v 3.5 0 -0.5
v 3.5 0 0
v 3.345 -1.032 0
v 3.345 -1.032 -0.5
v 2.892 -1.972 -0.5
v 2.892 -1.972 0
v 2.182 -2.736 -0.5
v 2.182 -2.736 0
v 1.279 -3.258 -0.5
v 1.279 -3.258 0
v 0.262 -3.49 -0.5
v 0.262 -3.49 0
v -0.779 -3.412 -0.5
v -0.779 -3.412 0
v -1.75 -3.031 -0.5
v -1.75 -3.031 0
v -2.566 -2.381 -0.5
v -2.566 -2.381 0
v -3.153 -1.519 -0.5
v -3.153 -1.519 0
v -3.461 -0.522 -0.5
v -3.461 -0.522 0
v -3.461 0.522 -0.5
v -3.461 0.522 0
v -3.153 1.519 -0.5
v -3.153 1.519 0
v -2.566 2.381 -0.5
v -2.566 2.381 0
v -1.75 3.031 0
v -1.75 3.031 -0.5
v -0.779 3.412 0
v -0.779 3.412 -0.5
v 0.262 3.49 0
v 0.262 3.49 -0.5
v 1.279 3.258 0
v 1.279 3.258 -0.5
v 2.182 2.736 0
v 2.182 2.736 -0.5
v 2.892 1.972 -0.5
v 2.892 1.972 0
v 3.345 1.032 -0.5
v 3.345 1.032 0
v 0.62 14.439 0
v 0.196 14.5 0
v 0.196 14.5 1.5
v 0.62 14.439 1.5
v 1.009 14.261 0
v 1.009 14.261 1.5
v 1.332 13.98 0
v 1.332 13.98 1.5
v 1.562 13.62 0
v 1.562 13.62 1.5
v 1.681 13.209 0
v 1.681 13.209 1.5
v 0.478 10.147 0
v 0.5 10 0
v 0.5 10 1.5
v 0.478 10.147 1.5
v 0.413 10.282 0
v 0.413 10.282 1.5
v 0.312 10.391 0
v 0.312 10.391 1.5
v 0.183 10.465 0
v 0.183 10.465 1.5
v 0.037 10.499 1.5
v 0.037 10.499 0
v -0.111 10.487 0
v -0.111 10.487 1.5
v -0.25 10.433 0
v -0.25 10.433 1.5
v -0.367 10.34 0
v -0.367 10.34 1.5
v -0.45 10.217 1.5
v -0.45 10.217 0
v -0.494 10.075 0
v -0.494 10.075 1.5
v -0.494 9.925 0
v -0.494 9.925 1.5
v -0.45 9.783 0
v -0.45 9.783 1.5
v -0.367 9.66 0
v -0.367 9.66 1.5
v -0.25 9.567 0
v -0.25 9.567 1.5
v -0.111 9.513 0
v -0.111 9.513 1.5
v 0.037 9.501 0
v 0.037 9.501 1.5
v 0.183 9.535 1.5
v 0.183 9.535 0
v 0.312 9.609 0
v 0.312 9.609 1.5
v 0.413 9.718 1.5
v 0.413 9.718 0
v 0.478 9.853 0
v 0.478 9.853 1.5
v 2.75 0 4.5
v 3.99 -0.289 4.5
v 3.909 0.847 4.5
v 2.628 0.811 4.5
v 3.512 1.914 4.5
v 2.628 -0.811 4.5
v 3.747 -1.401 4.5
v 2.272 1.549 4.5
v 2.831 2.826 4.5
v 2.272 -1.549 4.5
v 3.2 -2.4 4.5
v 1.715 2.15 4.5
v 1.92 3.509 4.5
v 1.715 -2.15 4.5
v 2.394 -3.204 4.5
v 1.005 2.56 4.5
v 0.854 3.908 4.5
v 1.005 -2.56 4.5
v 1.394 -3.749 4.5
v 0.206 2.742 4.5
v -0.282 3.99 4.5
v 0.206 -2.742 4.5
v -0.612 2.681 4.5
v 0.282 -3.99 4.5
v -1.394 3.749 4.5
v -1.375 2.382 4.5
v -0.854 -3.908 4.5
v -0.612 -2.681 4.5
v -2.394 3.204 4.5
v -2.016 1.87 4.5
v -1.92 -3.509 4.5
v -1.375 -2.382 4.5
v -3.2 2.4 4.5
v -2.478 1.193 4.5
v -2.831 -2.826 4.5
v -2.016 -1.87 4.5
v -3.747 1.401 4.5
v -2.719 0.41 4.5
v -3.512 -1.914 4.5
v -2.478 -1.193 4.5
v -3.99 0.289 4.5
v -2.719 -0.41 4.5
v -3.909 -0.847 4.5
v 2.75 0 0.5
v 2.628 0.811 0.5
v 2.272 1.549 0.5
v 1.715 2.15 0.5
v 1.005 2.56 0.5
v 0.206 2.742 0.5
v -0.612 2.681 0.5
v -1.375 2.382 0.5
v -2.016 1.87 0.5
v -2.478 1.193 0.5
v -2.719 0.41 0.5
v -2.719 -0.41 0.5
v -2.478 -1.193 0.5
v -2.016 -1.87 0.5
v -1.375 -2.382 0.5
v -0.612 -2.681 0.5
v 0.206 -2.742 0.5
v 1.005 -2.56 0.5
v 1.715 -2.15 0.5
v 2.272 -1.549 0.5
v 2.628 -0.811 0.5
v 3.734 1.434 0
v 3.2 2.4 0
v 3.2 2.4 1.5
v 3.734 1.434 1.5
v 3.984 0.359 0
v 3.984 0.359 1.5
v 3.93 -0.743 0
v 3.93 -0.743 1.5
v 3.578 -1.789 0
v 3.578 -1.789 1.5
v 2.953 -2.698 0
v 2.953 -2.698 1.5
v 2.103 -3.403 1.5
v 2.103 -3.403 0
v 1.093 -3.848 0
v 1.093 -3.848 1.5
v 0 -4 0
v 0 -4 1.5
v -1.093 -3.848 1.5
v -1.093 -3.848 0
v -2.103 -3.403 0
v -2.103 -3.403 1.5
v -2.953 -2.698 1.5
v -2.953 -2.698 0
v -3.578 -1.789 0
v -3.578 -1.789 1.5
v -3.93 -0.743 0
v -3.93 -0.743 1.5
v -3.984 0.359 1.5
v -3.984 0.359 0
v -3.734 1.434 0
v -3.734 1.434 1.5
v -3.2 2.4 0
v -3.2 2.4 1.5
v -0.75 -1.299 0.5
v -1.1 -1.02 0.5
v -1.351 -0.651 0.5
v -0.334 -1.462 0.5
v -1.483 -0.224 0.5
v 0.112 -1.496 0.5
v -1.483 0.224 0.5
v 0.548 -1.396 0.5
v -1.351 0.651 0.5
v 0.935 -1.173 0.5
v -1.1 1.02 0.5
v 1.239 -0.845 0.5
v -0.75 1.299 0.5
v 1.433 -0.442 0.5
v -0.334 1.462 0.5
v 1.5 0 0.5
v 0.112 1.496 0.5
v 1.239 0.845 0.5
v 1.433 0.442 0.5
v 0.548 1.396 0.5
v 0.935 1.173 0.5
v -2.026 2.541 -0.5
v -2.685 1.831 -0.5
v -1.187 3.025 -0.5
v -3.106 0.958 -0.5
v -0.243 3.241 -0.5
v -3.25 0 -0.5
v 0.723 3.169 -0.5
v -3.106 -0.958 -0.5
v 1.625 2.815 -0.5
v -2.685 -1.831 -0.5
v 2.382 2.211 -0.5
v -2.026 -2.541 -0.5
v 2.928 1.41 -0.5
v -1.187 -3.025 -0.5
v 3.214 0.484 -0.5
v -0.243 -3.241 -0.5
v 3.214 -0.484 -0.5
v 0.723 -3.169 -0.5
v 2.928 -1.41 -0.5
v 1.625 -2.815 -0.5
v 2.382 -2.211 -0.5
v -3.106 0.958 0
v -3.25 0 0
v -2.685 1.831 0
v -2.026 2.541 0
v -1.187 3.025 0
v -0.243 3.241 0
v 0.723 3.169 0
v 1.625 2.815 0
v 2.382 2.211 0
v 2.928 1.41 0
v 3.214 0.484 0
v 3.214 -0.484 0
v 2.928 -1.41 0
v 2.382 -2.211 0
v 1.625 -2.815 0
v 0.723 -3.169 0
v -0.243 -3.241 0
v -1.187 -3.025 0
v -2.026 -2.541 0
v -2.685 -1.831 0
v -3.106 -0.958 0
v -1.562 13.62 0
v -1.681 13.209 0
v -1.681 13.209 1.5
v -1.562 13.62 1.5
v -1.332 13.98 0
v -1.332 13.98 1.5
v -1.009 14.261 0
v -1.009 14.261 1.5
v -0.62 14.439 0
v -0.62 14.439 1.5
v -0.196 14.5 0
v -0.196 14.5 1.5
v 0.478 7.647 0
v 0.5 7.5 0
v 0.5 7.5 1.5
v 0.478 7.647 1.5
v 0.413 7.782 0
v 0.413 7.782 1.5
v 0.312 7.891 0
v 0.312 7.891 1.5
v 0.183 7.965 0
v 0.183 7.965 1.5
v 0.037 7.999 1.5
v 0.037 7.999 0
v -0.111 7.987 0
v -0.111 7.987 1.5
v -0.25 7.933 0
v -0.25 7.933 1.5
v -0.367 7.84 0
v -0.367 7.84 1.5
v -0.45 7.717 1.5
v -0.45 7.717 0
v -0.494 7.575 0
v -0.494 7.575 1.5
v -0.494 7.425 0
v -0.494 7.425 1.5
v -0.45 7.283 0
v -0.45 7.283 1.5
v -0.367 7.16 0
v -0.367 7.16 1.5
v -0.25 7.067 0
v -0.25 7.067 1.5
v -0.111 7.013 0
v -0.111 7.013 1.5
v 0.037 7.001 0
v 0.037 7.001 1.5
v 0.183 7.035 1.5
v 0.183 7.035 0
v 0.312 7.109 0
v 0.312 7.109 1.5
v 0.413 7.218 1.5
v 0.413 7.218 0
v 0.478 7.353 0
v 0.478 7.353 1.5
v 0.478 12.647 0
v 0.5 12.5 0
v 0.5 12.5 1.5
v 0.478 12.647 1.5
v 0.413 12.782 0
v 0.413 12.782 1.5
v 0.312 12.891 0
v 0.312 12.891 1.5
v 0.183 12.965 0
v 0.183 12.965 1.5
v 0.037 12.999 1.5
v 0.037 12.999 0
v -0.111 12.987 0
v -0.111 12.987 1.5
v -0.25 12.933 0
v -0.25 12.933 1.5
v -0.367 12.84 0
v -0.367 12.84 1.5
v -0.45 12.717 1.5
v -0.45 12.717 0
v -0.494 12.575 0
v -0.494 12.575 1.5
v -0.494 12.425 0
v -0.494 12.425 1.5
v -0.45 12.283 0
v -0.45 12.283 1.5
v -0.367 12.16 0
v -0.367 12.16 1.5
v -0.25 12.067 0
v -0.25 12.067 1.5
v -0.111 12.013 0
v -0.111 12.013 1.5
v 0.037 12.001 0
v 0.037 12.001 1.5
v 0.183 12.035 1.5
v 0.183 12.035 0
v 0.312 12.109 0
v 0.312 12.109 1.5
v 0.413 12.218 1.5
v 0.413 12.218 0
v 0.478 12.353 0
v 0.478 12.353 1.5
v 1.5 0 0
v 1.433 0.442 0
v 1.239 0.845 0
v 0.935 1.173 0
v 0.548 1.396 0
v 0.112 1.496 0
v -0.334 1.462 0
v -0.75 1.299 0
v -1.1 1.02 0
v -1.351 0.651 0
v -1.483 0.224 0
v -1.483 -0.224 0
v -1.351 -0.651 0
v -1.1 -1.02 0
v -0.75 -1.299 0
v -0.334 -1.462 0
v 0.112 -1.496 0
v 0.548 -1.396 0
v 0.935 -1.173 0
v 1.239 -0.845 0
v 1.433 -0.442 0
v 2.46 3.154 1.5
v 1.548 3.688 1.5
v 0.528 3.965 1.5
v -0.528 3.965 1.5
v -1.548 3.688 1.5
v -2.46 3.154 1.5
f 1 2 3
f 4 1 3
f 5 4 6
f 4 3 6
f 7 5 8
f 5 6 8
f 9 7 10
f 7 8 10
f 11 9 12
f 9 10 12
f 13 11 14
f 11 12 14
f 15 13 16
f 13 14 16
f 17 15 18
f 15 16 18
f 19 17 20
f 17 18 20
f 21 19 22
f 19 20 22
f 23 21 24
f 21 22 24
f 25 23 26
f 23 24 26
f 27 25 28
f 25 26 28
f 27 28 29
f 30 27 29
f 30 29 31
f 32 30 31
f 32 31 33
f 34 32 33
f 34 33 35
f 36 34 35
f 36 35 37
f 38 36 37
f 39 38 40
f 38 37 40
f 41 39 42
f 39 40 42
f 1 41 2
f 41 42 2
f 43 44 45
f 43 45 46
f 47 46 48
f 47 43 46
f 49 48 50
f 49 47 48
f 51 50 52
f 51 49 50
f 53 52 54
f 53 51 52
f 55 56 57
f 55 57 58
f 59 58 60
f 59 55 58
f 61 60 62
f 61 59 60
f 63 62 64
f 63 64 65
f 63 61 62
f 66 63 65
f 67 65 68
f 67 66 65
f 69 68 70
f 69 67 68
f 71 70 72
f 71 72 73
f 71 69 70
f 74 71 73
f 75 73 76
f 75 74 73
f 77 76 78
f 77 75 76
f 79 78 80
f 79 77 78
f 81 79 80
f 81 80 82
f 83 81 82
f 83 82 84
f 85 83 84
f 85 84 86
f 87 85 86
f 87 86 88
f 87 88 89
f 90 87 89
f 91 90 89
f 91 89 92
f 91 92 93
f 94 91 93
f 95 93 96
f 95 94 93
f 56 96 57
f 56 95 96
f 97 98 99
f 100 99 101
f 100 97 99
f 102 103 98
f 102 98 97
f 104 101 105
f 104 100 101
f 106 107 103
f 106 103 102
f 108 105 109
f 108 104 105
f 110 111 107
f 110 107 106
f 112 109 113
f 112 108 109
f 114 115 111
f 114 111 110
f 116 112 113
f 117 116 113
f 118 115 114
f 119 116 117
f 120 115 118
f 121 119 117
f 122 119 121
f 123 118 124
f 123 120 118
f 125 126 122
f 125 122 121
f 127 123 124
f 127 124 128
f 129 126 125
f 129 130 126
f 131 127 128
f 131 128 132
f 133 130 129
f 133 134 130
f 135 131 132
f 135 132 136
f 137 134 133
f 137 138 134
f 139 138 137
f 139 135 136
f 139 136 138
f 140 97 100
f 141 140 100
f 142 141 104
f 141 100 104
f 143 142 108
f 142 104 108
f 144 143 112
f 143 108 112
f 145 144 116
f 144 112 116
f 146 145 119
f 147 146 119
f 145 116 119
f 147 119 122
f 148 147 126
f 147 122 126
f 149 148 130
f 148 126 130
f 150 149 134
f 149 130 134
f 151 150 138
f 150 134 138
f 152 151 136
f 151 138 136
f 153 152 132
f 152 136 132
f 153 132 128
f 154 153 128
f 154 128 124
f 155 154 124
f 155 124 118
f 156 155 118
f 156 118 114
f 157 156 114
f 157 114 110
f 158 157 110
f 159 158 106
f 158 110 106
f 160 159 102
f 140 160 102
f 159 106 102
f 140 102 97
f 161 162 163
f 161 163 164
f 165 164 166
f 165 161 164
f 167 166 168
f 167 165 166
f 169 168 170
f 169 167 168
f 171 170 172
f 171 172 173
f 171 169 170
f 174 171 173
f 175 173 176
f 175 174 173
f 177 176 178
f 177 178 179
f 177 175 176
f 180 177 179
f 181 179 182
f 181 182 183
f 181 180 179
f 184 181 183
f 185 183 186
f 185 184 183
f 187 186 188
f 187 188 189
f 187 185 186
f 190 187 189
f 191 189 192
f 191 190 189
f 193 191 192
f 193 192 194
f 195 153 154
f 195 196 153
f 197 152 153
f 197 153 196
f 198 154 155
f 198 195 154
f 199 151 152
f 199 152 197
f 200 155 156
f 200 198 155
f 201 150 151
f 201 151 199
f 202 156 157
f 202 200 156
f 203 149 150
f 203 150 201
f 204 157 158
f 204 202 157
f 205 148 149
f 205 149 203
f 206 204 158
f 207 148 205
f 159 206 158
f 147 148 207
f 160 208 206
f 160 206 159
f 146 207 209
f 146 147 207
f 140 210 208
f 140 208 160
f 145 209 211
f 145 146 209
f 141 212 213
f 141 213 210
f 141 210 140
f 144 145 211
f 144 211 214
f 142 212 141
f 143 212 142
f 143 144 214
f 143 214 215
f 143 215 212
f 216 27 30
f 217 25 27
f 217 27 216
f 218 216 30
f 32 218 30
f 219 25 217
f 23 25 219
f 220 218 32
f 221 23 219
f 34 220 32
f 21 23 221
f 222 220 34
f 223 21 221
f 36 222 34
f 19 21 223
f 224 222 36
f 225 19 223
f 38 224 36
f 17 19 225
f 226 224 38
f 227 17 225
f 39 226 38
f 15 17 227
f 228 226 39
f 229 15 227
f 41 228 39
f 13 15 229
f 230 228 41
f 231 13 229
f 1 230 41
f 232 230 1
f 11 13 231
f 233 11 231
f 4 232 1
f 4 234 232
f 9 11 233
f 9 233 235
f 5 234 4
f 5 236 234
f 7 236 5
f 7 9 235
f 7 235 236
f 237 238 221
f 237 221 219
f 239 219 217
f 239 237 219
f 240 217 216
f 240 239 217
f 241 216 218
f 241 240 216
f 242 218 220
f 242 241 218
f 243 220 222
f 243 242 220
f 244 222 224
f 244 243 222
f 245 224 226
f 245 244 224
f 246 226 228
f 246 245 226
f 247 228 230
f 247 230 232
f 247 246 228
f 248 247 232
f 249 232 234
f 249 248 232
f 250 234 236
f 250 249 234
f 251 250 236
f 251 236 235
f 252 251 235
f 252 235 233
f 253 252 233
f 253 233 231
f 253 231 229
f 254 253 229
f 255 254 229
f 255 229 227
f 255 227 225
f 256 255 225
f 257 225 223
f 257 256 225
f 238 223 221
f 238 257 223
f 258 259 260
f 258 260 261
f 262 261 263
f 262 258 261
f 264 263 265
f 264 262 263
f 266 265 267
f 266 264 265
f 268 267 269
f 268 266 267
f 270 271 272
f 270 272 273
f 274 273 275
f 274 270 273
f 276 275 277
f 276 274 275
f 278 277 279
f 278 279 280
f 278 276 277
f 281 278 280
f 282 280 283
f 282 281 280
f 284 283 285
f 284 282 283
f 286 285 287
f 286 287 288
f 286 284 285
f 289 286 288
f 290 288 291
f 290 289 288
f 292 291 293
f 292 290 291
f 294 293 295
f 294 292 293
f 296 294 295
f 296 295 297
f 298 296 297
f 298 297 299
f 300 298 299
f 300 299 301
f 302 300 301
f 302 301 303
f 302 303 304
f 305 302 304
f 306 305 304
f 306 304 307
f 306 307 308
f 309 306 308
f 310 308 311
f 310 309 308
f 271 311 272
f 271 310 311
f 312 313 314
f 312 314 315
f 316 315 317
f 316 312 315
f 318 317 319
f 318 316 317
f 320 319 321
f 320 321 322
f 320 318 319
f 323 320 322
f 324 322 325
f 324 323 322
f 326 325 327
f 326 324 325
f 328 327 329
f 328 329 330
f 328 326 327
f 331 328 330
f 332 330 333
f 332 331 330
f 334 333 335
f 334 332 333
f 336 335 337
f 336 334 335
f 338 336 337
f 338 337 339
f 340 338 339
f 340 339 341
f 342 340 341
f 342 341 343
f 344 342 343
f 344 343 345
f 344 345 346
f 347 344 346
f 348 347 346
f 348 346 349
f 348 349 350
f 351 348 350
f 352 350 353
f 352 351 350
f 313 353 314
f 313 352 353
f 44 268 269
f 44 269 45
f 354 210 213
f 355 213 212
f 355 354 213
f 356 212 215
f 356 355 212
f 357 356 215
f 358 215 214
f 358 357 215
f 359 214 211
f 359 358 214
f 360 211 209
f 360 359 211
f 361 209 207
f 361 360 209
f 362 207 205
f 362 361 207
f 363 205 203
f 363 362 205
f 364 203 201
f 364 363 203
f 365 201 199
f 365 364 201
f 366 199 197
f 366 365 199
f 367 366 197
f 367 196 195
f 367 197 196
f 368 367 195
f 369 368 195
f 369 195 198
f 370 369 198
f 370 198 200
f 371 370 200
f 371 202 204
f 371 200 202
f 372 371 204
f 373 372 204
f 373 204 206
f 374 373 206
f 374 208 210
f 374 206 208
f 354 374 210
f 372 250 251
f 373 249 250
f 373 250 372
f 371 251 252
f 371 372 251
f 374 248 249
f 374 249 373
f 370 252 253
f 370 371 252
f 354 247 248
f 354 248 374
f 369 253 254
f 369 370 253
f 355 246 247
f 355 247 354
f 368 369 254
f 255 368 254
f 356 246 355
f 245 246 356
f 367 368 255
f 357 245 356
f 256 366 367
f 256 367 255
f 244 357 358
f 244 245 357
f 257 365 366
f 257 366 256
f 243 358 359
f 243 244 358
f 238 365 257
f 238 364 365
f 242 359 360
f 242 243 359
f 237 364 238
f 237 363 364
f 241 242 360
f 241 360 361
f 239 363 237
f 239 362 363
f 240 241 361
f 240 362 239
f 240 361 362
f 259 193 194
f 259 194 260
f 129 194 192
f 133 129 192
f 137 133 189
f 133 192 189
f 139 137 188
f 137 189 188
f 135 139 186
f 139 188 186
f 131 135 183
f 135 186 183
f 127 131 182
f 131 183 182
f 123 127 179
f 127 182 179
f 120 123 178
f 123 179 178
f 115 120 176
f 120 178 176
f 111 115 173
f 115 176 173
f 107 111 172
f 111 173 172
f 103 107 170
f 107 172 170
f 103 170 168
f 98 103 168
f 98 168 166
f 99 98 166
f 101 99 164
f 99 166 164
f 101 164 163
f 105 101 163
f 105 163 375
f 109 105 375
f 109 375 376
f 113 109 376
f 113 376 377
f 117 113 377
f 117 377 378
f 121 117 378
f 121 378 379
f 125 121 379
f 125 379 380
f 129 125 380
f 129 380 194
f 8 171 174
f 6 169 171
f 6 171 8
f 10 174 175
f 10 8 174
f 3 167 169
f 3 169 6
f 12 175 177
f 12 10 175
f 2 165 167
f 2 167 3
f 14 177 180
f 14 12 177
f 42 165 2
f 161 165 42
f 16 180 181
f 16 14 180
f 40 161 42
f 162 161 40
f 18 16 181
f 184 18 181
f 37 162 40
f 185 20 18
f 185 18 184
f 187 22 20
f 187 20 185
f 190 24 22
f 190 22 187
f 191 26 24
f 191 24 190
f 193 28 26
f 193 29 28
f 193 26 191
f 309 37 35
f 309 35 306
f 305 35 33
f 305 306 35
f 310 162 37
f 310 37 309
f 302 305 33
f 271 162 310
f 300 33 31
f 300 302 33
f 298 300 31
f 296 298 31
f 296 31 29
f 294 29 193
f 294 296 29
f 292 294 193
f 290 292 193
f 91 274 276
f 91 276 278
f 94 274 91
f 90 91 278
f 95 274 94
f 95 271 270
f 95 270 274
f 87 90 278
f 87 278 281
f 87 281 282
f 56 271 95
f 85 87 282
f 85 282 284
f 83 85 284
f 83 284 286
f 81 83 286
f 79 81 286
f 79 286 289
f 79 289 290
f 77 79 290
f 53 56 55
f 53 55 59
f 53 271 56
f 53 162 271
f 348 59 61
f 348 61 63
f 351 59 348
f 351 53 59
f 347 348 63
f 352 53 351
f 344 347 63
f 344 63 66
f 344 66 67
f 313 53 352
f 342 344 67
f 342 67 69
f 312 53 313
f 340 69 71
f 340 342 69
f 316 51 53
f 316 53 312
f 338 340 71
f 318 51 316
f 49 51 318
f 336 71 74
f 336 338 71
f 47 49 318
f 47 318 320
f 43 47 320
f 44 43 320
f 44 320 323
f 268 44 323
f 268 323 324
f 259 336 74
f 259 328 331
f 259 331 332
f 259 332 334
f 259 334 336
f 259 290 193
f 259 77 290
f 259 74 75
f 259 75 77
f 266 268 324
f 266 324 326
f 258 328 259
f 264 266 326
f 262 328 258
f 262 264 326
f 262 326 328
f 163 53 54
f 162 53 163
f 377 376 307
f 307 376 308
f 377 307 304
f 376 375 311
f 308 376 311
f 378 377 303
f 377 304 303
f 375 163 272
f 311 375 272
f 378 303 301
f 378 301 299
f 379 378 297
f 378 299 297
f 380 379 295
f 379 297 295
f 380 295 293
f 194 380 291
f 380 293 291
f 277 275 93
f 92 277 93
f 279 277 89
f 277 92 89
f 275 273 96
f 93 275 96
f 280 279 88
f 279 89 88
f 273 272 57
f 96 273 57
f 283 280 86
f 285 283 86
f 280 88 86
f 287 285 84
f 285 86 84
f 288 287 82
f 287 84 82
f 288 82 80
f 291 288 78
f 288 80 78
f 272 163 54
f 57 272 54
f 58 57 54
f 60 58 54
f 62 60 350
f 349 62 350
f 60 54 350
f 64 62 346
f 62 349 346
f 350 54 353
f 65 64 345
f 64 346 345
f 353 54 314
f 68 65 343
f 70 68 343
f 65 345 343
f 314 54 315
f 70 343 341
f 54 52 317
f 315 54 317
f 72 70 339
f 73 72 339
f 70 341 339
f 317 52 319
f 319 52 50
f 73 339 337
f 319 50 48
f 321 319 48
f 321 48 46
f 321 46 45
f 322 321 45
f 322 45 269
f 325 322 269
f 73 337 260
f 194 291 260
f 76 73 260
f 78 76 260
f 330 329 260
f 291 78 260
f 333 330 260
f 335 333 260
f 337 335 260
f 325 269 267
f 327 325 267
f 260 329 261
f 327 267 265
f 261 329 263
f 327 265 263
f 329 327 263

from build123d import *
from build123d.topology import SkipClean

# Parameters (mm, degrees)
SKETCH1_R           = 0.5
SKETCH1_R_2         = 1.5
BOSS_EXTRUDE3_DEPTH = 1.5
SKETCH2_R           = 4
BOSS_EXTRUDE4_DEPTH = 3
SKETCH3_R           = 3.5
SKETCH3_R_2         = 3.25
BOSS_EXTRUDE5_DEPTH = 0.5
SKETCH4_R           = 2.75
CUT_EXTRUDE1_DEPTH  = 4


with BuildPart() as part:
    # Sketch1 → Boss-Extrude3 (new body)
    with BuildSketch(Plane.XY):
        with BuildLine():
            Line((-3.2, 2.4), (-1.681423136, 13.208694151))
            ThreePointArc((-1.681423136, 13.208694151), (-1.180125332, 14.132042673), (-0.196011829, 14.5))
            Line((-0.196011829, 14.5), (0.196011829, 14.5))
            ThreePointArc((0.196011829, 14.5), (1.180125332, 14.132042673), (1.681423136, 13.208694151))
            Line((1.681423136, 13.208694151), (3.2, 2.4))
            ThreePointArc((3.2, 2.4), (0, -4), (-3.2, 2.4))
        make_face()
        with Locations((0, 10)):
            Circle(SKETCH1_R, mode=Mode.SUBTRACT)
        with Locations((0, 12.5)):
            Circle(SKETCH1_R, mode=Mode.SUBTRACT)
        with Locations((0, 7.5)):
            Circle(SKETCH1_R, mode=Mode.SUBTRACT)
        Circle(SKETCH1_R_2, mode=Mode.SUBTRACT)
    extrude(amount=BOSS_EXTRUDE3_DEPTH)

    # Sketch2 → Boss-Extrude4 (add)
    with SkipClean():  # the faces are left unmerged after this step: merging them gives an invalid solid
        with BuildSketch(Plane.XY.offset(1.5)):
            with Locations(Location((0, 0, 0), (0, 0, 143.130102354))):
                Circle(SKETCH2_R)
        extrude(amount=BOSS_EXTRUDE4_DEPTH)

    # Sketch3 → Boss-Extrude5 (add)
    with SkipClean():  # the faces are left unmerged after this step: merging them gives an invalid solid
        with BuildSketch(Plane(origin=(0, 0, 0), x_dir=(-1, 0, 0), z_dir=(0, 0, -1))):
            with Locations(Location((0, 0, 0), (0, 0, 180))):
                Circle(SKETCH3_R)
            Circle(SKETCH3_R_2, mode=Mode.SUBTRACT)
        extrude(amount=BOSS_EXTRUDE5_DEPTH)

    # Sketch4 → Cut-Extrude1 (cut)
    with SkipClean():  # the faces are left unmerged after this step: merging them gives an invalid solid
        with BuildSketch(Plane.XY.offset(4.5)):
            Circle(SKETCH4_R)
        extrude(amount=-CUT_EXTRUDE1_DEPTH, mode=Mode.SUBTRACT)


solid = part.part
